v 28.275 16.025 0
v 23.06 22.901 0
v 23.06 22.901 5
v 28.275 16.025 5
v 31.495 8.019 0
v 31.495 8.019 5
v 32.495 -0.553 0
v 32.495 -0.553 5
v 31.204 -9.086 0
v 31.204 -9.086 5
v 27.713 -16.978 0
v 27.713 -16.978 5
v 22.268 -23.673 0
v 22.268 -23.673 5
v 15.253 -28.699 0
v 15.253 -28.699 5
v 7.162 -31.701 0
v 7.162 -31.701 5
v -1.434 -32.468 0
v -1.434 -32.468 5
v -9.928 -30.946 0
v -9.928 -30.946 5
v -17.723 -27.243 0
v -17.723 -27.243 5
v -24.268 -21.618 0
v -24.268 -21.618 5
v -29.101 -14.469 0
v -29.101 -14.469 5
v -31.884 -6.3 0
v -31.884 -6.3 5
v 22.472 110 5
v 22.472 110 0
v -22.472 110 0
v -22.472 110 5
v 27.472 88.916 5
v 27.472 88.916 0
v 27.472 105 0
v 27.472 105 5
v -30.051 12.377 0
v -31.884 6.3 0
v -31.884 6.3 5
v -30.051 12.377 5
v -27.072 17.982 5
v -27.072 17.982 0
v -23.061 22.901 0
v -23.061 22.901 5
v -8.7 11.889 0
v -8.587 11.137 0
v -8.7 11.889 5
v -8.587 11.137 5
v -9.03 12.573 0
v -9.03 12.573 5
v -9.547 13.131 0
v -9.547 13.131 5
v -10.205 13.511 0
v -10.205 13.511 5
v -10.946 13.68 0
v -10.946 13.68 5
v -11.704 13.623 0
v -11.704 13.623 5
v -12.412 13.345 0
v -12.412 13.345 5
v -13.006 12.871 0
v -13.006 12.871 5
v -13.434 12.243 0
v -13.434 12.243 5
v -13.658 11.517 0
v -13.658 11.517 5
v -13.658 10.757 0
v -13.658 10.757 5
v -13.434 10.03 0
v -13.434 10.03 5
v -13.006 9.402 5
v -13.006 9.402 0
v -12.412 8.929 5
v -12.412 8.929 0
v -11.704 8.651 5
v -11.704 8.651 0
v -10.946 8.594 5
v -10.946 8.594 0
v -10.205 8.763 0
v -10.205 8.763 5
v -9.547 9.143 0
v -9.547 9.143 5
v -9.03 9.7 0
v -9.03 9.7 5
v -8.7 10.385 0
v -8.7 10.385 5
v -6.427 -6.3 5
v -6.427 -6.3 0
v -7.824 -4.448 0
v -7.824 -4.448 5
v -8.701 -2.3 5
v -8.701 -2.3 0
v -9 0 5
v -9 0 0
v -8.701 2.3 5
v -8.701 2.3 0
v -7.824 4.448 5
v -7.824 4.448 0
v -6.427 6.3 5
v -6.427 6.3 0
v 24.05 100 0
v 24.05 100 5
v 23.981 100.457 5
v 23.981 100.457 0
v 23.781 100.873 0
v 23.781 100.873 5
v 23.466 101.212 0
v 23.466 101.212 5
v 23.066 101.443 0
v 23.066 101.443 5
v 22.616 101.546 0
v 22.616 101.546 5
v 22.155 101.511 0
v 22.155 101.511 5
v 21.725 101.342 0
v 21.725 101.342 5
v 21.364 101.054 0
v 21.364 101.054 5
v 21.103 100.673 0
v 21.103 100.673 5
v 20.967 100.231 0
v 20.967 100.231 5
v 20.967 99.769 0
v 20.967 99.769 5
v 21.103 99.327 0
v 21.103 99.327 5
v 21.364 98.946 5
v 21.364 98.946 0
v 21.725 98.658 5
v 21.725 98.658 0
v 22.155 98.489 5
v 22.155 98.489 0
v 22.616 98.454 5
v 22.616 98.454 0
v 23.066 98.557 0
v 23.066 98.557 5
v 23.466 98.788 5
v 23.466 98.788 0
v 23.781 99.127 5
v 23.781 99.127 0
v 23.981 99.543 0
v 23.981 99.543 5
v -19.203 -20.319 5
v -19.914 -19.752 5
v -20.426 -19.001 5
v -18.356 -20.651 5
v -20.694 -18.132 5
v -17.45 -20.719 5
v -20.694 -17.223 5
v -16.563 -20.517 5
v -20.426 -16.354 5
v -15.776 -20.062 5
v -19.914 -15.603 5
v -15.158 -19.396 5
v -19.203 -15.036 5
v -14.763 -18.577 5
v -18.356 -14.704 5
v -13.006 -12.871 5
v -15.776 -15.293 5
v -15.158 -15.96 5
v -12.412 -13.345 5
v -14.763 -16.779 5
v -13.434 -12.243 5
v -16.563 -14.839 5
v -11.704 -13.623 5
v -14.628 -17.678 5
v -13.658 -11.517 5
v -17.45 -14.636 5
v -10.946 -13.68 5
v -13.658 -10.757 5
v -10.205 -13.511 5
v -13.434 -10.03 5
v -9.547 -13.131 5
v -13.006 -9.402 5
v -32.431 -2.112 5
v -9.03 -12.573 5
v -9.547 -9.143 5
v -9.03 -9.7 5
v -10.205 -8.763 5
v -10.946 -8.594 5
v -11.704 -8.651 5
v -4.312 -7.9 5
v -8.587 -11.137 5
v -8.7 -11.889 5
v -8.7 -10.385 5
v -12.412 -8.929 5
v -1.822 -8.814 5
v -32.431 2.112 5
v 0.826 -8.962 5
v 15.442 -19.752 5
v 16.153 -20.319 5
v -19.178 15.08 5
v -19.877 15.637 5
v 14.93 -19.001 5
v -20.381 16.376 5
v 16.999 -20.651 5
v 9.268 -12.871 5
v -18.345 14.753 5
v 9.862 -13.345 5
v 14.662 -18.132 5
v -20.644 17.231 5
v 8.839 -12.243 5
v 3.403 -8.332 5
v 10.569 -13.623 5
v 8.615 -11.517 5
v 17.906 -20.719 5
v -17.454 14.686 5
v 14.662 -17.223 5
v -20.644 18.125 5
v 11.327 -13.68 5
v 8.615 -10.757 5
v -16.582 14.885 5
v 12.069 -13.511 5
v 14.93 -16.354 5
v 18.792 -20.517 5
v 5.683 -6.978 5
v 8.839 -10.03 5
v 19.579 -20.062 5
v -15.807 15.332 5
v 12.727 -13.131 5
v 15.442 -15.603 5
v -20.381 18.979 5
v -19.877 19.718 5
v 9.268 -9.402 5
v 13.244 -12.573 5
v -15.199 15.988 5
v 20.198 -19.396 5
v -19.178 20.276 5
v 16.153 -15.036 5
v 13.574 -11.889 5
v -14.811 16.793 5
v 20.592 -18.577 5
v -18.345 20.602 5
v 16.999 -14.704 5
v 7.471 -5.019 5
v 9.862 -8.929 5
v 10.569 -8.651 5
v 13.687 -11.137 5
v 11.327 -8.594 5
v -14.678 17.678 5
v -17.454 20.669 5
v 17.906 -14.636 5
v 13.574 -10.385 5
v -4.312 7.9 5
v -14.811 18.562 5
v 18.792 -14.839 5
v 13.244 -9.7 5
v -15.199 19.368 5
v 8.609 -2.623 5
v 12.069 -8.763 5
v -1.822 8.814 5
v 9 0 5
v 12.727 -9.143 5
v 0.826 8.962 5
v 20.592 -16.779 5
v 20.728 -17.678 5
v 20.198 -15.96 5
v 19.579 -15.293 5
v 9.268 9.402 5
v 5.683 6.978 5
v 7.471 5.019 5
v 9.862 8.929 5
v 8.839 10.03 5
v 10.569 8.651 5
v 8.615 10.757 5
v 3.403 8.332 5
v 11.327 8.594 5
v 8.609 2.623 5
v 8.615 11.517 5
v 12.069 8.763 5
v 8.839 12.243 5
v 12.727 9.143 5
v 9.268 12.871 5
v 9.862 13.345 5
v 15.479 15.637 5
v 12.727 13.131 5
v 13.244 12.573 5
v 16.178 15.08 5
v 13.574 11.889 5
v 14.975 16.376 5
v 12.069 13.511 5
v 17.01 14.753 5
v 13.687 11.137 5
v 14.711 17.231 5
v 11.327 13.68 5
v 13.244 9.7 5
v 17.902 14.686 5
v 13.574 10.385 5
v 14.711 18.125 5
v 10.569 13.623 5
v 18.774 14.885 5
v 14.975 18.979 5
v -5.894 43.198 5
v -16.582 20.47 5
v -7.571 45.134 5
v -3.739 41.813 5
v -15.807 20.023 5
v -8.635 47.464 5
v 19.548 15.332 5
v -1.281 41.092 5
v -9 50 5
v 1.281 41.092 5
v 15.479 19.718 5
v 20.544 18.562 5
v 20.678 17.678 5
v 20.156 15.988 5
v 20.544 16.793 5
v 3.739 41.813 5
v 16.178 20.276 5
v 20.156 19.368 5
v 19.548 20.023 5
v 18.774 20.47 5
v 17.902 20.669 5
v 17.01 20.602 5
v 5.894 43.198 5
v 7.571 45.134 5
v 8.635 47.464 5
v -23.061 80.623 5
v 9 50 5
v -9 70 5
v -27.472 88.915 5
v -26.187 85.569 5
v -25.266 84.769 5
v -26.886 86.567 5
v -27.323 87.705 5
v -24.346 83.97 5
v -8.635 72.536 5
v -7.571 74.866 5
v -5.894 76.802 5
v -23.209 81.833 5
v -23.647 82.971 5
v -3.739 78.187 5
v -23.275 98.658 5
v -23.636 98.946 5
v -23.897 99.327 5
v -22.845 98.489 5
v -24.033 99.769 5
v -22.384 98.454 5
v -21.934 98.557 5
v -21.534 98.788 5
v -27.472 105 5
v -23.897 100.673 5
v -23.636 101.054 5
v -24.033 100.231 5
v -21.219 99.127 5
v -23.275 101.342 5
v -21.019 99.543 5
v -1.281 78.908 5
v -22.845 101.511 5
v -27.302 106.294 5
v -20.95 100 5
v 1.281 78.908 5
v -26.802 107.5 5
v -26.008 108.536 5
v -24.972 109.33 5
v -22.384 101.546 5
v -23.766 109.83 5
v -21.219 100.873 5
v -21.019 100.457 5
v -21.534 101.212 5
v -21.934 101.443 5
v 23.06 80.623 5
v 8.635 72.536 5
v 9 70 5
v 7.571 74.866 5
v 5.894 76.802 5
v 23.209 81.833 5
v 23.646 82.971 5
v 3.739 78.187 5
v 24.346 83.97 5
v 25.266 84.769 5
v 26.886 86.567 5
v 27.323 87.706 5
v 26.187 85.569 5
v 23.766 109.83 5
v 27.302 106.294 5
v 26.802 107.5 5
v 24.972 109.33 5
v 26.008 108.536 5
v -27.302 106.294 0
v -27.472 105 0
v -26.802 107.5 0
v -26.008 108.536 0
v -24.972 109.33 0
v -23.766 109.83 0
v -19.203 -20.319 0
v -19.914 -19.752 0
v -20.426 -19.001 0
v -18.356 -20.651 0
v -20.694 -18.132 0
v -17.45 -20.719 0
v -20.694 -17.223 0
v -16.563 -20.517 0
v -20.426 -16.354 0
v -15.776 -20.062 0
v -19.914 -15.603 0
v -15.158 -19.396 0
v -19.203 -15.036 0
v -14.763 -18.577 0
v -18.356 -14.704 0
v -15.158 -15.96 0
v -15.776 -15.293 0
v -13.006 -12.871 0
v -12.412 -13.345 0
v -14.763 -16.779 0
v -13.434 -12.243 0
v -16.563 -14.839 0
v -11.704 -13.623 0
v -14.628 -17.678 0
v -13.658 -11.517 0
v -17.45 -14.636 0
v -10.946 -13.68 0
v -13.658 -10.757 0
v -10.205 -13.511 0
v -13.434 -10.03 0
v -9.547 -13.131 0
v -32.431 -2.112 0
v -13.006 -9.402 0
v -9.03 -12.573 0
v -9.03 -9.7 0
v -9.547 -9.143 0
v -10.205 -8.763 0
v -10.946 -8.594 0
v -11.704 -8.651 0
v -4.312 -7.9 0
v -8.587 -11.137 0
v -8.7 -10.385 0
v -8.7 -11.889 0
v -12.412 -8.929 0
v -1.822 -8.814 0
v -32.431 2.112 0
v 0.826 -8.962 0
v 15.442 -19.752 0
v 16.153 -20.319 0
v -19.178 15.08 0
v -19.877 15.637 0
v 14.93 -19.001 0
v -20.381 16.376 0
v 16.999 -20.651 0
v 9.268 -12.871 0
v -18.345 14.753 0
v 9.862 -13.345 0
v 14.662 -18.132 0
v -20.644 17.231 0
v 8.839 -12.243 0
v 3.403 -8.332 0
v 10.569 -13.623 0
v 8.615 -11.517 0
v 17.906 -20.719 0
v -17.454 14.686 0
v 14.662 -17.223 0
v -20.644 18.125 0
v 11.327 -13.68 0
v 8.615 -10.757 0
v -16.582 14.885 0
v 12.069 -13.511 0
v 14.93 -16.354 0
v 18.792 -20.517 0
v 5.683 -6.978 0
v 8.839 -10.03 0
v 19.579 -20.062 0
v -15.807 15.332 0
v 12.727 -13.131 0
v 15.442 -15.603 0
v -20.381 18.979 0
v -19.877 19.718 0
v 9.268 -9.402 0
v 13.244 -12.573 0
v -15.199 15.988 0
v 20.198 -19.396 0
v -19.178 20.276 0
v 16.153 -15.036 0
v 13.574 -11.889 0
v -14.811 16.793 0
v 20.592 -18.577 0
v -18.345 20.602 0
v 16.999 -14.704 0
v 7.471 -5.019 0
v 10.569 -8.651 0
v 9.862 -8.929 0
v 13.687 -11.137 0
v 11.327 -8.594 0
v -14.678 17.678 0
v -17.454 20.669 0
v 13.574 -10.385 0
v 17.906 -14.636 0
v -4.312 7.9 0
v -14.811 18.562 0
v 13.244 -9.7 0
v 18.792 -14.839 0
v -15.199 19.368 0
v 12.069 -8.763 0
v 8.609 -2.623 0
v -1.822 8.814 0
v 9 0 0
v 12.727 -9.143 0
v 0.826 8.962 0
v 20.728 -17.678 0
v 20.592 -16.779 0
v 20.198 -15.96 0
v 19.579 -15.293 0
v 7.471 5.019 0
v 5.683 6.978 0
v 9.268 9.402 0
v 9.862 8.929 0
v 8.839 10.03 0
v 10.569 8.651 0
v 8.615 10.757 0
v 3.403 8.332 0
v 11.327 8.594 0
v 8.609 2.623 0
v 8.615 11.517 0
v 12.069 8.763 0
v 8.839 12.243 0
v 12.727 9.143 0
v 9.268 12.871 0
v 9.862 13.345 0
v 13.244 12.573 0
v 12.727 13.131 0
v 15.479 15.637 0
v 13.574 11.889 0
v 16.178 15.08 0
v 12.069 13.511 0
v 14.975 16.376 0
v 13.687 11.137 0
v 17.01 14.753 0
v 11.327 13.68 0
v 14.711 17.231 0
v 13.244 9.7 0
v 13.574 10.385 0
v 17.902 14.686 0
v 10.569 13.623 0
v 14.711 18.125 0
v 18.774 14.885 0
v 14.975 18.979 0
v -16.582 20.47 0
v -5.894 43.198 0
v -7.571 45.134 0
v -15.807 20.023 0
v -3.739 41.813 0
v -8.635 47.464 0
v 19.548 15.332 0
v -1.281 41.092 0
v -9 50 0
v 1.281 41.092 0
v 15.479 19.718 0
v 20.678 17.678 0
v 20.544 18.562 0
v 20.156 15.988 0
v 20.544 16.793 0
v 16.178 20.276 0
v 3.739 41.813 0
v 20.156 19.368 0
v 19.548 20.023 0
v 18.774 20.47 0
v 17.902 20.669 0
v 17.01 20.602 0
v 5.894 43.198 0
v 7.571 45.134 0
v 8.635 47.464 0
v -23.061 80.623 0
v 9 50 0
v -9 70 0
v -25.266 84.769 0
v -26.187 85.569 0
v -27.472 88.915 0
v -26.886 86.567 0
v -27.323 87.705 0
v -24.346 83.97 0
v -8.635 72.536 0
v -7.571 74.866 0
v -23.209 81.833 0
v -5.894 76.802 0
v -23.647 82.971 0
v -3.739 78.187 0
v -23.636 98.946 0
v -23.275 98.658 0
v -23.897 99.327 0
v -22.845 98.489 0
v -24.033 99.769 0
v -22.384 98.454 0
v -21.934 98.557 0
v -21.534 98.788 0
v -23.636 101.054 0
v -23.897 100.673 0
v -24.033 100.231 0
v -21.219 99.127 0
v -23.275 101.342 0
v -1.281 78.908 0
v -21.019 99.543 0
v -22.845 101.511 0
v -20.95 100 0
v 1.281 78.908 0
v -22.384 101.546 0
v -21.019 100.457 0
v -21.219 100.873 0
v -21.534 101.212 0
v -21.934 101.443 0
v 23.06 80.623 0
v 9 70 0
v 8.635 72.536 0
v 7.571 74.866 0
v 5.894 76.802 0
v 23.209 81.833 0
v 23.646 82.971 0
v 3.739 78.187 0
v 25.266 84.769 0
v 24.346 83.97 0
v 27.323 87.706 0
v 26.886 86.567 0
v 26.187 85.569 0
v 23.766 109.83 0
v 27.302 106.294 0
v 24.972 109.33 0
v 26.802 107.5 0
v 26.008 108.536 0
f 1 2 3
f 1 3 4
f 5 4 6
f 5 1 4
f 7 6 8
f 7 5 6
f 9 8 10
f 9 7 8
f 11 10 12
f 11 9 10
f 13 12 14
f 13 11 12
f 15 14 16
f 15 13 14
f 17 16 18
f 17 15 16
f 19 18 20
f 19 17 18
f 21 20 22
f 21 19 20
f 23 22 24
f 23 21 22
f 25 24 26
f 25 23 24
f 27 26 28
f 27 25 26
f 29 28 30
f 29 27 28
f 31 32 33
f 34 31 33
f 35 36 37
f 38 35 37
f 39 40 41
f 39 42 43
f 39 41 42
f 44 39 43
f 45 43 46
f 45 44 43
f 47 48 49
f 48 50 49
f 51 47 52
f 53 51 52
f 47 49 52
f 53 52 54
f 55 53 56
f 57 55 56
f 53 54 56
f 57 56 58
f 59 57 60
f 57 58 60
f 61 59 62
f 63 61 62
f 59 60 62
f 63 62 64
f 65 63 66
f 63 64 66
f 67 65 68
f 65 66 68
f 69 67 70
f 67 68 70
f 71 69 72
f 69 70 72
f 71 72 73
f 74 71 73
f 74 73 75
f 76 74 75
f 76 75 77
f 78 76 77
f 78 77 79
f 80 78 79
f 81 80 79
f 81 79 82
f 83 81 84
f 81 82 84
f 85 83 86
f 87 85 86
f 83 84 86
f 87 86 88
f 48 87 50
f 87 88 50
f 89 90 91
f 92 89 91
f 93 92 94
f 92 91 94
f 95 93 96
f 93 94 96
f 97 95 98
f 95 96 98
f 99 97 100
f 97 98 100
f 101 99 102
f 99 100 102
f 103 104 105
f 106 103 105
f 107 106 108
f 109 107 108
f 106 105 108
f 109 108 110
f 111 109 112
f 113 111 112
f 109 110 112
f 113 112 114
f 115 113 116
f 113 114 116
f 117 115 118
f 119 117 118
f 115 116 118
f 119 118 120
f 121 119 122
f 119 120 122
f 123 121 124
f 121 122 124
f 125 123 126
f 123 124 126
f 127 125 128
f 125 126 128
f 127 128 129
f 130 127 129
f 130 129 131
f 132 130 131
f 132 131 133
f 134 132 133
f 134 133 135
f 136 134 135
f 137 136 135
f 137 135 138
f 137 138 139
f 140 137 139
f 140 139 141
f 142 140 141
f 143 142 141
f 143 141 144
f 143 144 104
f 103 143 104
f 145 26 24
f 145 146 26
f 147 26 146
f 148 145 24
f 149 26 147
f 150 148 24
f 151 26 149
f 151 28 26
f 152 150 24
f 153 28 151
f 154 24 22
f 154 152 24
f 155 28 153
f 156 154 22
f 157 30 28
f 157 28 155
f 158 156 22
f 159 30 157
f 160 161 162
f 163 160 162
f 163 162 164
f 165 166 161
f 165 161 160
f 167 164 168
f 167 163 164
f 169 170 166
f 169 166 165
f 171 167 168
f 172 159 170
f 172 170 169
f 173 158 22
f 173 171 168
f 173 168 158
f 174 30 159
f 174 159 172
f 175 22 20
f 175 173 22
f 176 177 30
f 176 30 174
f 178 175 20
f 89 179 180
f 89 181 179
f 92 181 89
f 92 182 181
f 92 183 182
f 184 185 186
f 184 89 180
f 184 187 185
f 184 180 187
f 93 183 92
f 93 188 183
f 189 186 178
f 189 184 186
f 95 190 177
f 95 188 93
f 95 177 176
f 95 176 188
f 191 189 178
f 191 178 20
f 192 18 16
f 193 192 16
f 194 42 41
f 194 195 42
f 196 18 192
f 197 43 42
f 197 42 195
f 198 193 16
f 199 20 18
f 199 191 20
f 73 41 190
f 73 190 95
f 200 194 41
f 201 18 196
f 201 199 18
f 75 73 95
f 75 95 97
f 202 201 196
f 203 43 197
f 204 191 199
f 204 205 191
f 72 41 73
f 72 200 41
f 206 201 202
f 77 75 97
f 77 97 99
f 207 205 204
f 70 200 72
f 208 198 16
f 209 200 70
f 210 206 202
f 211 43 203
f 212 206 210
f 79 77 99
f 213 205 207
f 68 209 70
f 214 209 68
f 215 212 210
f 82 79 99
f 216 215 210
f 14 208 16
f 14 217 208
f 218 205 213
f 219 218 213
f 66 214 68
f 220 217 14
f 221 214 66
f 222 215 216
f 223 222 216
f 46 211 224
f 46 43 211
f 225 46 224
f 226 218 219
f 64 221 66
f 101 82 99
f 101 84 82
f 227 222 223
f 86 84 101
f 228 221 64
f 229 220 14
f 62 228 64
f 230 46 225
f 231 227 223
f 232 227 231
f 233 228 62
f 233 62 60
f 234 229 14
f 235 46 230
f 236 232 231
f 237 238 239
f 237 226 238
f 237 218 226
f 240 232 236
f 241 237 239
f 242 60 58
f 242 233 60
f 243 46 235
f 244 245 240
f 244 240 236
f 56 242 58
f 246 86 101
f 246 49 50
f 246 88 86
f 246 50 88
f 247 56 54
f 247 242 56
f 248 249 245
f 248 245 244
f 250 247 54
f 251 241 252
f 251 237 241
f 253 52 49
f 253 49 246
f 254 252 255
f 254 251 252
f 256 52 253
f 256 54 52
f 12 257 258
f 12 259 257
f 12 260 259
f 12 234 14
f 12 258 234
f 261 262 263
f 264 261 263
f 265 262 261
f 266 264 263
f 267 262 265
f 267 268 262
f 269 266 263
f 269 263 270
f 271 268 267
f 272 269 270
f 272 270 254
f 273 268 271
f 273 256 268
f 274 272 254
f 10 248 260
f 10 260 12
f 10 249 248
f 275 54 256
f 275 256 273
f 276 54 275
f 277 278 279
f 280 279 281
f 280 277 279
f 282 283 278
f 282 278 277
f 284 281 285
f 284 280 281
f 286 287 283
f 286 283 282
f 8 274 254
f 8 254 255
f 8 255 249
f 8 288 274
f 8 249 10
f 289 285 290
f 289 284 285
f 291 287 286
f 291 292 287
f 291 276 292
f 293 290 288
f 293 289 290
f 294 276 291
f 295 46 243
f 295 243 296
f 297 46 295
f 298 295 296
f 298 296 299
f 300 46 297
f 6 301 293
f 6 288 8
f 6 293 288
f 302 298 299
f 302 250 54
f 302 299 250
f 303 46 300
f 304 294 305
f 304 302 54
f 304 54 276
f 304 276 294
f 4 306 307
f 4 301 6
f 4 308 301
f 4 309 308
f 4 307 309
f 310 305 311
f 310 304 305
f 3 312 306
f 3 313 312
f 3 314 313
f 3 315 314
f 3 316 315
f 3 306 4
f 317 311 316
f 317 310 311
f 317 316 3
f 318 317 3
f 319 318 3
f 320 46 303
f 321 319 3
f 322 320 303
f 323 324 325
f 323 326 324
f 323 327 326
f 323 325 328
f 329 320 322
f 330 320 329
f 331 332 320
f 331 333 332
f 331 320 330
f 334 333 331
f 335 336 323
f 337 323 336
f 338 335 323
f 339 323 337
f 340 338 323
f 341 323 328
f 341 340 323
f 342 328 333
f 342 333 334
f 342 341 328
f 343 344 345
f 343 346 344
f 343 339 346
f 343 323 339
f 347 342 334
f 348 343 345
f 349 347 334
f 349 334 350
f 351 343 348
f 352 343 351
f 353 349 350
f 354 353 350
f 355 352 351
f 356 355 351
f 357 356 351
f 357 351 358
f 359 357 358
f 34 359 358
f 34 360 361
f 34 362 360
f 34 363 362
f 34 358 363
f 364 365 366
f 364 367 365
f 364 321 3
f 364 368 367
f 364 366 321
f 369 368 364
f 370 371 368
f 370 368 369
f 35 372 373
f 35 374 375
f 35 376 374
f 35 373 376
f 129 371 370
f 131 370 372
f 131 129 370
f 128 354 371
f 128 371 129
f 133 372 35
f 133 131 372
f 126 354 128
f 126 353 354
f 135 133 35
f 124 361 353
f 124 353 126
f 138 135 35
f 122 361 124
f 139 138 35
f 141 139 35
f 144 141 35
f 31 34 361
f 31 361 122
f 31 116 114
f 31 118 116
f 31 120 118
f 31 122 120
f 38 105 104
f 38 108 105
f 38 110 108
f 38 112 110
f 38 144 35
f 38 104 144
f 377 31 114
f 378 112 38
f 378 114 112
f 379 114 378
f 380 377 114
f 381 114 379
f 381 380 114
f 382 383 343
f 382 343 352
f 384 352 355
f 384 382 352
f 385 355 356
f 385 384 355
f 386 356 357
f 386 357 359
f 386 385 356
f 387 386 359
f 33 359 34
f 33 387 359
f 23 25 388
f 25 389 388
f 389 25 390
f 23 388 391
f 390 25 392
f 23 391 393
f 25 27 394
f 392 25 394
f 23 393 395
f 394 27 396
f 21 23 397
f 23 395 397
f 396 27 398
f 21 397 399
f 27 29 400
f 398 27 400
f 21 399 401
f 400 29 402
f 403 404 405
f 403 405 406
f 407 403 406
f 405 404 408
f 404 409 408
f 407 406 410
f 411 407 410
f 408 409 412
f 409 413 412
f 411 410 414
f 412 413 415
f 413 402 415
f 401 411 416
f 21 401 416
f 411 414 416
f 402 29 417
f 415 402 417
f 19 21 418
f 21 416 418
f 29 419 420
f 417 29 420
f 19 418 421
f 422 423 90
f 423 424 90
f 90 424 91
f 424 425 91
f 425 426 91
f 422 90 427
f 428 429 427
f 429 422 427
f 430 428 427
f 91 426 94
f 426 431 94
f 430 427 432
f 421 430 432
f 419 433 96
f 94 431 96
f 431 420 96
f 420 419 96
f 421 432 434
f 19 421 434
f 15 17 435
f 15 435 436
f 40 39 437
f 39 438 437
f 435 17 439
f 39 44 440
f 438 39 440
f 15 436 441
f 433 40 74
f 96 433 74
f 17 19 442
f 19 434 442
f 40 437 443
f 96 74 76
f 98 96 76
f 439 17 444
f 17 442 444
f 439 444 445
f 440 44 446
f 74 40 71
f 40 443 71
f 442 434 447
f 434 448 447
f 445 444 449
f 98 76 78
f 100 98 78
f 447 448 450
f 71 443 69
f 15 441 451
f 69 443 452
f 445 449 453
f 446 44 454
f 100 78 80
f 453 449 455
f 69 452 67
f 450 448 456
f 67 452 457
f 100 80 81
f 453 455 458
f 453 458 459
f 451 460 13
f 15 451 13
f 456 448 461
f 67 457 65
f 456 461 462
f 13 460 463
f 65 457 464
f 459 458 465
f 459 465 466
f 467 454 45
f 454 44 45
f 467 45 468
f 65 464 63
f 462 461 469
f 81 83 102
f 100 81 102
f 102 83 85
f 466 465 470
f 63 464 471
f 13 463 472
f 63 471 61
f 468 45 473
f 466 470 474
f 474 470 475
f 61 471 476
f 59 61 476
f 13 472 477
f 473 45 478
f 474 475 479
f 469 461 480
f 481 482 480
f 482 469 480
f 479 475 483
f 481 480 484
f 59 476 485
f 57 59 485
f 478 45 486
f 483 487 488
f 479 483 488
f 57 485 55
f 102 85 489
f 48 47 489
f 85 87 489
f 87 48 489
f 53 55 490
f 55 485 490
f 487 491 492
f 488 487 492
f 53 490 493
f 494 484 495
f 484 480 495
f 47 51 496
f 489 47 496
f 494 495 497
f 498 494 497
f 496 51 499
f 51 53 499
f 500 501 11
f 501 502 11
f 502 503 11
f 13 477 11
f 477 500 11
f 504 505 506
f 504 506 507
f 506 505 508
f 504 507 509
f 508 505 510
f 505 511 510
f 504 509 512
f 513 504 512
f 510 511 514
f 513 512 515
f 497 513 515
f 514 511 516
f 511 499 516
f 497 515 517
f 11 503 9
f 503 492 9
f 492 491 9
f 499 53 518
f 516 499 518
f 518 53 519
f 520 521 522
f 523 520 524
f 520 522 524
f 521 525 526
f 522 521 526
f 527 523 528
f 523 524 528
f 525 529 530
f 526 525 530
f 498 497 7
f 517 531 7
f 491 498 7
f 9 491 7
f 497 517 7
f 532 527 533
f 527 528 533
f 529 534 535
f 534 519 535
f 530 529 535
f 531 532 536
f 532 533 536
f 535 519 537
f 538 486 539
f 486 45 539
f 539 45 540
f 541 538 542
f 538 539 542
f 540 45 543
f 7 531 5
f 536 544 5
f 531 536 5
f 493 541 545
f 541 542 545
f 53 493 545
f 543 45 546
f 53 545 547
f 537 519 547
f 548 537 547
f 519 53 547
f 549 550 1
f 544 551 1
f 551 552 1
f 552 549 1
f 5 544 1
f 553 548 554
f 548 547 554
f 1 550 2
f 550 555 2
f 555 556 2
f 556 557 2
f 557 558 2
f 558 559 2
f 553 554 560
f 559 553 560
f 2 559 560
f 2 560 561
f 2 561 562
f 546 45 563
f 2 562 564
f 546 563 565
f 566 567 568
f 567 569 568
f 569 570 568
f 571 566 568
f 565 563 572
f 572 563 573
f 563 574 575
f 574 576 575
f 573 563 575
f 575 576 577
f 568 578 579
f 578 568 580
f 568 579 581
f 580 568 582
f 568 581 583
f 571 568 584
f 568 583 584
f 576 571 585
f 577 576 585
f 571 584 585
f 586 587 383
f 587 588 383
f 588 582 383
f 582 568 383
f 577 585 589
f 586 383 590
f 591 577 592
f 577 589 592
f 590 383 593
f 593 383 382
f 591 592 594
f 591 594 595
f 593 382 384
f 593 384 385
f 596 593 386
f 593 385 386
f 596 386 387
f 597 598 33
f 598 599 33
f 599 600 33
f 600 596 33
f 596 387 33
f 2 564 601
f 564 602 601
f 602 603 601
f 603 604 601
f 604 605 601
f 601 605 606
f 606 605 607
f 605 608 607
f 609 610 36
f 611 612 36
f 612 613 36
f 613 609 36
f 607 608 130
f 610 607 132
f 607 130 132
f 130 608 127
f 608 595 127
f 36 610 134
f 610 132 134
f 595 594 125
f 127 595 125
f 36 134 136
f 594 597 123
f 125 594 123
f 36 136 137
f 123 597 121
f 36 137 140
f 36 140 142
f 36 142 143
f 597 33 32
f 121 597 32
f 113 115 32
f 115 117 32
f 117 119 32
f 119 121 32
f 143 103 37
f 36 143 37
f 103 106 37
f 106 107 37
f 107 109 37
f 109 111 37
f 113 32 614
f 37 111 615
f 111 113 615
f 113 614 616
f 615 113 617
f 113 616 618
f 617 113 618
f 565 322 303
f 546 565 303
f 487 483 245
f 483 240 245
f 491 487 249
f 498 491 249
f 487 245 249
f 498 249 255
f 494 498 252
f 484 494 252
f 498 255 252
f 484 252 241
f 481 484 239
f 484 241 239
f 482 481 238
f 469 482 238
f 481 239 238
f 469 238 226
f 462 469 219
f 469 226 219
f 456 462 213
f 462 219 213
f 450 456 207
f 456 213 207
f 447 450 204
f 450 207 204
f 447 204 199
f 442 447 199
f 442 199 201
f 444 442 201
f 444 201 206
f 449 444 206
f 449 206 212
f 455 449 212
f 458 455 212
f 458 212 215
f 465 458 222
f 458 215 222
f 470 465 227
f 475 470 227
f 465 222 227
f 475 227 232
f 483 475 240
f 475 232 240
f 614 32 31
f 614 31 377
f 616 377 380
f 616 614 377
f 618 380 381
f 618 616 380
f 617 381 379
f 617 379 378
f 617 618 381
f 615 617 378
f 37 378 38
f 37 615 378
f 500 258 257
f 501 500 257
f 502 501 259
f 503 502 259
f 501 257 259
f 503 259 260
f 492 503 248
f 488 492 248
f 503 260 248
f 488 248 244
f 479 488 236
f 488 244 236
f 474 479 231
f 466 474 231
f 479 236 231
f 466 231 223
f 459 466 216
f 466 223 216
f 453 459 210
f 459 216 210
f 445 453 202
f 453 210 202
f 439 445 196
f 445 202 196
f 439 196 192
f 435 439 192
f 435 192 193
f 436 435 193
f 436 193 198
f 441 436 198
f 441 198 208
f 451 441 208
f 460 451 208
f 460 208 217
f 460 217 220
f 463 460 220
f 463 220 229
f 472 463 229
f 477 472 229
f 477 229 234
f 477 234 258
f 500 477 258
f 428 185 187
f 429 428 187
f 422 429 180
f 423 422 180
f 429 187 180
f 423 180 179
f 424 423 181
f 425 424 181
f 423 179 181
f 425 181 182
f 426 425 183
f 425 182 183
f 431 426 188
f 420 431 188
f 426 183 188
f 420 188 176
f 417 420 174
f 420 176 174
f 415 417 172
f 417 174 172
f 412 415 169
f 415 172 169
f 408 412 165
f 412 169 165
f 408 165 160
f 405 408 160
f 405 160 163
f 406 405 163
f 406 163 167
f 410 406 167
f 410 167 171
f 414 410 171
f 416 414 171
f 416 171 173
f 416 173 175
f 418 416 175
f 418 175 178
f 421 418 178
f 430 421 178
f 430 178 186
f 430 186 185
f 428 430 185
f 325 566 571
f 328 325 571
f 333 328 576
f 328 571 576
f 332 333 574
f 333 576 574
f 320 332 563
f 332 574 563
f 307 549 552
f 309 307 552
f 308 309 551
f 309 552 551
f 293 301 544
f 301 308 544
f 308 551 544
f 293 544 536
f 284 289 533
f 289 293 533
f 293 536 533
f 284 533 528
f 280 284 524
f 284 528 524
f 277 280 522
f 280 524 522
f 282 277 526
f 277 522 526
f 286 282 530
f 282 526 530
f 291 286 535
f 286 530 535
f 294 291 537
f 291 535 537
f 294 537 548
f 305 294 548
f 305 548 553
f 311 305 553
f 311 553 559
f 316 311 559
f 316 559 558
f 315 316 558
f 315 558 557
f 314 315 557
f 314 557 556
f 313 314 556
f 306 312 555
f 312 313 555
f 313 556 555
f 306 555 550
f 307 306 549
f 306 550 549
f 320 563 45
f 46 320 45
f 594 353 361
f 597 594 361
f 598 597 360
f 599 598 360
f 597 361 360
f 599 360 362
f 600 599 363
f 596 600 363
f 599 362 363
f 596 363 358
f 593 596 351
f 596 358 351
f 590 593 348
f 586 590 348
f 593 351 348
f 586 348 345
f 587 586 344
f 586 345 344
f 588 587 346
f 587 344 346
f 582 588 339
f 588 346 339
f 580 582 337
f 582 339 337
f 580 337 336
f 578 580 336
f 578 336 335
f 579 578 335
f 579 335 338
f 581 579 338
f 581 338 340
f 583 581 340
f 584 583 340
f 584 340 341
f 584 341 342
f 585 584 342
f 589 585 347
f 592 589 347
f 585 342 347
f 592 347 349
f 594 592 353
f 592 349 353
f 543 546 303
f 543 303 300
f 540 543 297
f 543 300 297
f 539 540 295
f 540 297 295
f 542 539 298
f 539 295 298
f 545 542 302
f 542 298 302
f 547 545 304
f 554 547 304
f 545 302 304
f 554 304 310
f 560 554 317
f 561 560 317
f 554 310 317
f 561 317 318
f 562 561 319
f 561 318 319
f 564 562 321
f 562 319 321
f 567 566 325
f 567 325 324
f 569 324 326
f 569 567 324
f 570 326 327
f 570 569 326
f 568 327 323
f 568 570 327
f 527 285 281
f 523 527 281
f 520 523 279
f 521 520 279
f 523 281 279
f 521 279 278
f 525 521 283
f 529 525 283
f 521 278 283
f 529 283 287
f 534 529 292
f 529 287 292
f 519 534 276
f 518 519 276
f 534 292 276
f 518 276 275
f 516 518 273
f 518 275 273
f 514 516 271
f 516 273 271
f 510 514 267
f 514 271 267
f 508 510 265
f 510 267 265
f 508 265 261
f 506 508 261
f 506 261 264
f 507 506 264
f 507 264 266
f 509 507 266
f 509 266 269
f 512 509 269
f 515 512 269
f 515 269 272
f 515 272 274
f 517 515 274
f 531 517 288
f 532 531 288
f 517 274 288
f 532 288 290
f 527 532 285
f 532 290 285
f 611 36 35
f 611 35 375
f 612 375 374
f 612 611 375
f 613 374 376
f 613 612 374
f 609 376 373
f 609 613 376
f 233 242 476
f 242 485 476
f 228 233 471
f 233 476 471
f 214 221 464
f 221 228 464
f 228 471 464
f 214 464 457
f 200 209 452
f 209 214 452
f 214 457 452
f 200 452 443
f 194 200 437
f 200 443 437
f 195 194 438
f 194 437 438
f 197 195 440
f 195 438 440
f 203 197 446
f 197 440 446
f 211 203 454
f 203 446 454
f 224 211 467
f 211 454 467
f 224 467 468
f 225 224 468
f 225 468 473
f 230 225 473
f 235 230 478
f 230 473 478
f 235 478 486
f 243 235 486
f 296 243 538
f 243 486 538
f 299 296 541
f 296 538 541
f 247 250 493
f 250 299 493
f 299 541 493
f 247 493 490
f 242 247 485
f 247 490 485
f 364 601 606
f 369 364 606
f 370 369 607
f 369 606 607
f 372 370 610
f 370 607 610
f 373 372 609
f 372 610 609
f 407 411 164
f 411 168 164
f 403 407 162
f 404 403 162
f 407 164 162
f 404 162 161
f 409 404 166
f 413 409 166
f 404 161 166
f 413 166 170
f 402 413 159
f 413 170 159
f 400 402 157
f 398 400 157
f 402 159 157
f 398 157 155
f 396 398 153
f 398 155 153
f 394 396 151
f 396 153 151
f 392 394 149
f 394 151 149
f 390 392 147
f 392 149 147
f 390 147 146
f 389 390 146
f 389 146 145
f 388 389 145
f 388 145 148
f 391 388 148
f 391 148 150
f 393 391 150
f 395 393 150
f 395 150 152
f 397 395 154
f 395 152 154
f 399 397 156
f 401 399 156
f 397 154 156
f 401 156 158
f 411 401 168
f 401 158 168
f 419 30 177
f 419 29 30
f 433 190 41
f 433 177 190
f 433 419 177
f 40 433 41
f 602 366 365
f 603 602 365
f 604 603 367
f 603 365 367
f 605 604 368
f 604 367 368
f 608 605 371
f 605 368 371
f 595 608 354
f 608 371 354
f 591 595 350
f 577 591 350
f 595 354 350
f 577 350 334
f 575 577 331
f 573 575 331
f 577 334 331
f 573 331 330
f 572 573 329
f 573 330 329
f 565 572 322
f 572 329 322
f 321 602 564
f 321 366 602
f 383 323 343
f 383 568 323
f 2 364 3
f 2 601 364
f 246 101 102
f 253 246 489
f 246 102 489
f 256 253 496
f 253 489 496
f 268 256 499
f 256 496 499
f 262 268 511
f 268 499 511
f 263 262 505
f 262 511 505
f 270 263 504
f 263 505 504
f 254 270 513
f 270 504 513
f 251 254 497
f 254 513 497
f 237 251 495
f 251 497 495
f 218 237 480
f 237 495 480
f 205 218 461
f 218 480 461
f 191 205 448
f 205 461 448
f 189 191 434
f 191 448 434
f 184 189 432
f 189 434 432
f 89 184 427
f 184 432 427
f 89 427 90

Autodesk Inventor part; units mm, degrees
ref_plane "YZ Plane" through (0, 0, 0) normal (1, 0, 0) x (0, 1, 0)
ref_plane "XZ Plane" through (0, 0, 0) normal (0, 1, 0) x (-1, 0, 0)
ref_plane "XY Plane" through (0, 0, 0) normal (0, 0, 1) x (1, 0, 0)
sketch "Sketch1" plane through (0, 0, 0) normal (0, 0, 1) x (1, 0, 0)
  circle A0 centre (17.6777, -17.6777) radius 3
  circle A1 centre (-17.6777, -17.6777) radius 3
  circle A2 centre (-17.6777, 17.6777) radius 3
  circle A3 centre (17.6777, 17.6777) radius 3
  circle A4 centre (-11.1369, -11.1369) radius 2.5
  circle A5 centre (11.1369, -11.1369) radius 2.5
  circle A6 centre (-11.1369, 11.1369) radius 2.5
  circle A7 centre (11.1369, 11.1369) radius 2.5
  arc A8 (-6.4273, -6.3) -> (-6.4273, 6.3) centre (0, 0) ccw
  arc A9 (-31.8835, -6.3) -> (-31.8835, 6.3) centre (0, 0) ccw
  circle A10 centre (0, 0) radius 32.5
  circle A11 centre (0, 0) radius 9
  line L0 (22.4721, 110) -> (-22.4721, 110)
  line L1 (-27.4721, 105) -> (-27.4721, 90)
  line L2 (-23.0608, 85.5886) -> (-23.0608, 31.884)
  line L3 (23.0603, 31.884) -> (23.0603, 85.5881)
  line L4 (27.4721, 90) -> (27.4721, 105)
  circle A12 centre (22.5, 100) radius 1.5
  circle A13 centre (-22.5, 100) radius 1.5
  circle A14 centre (11.1369, -11.1369) radius 2.5
  circle A15 centre (11.1369, 11.1369) radius 2.5
  circle A16 centre (-11.1369, 11.1369) radius 2.5
  circle A17 centre (-11.1369, -11.1369) radius 2.5
  line L5 (27.4721, 105) -> (27.4721, 110)
  line L6 (27.4721, 110) -> (-27.4721, 110)
  line L7 (-27.4721, 110) -> (-27.4721, 105)
  line L8 (27.4721, 90) -> (27.4721, 85.5881)
  line L9 (27.4721, 85.5881) -> (-27.4721, 85.5881)
  line L10 (-27.4721, 85.5881) -> (-27.4721, 90)
  line L11 (-23.0608, 31.884) -> (-23.0608, 22.9009)
  line L12 (23.0603, 31.884) -> (23.0603, 22.9014)
  point P0 (-31.8835, 6.3)
  point P1 (-23.0608, 85.5881)
  point P2 (-6.4273, 6.3)
extrude "Extrusion1" add sketch "Sketch1" along normal blind 5
fillet "Fillet1" radius 5 6 edges at (-27.4721, 110, 2.5) (27.4721, 110, 2.5) (-27.4721, 85.5881, 2.5) (-23.0608, 85.5881, 2.5) (27.4721, 85.5881, 2.5) (23.0603, 85.5881, 2.5)
sketch "Sketch2" plane through (0, 0, 5) normal (0, 0, 1) x (1, 0, 0)
  circle A0 centre (-22.5, 100) radius 1.5 projected
  arc A1 (9, 70) -> (-9, 70) centre (0, 70) ccw
  line L0 (-9, 70) -> (-9, 50)
  line L1 (9, 70) -> (9, 50)
  line L2 (0, 40) -> (0, 50)
  arc A2 (-9, 50) -> (9, 50) centre (0, 50) ccw
  point P0 (0, 0)
  dimension "d9" = 18
  dimension "d12" = 10
  dimension "d13" = 18
extrude "Extrusion2" cut sketch "Sketch2" against normal blind 10 contours L1 A2 L0 A1
sketch "Sketch3" plane through (0, 0, 5) normal (0, 0, 1) x (1, 0, 0)
  circle A0 centre (-22.5, 100) radius 1.5 projected
  circle A1 centre (-22.5, 100) radius 1.55
  circle A2 centre (22.5, 100) radius 1.5 projected
  circle A3 centre (22.5, 100) radius 1.55
  circle A4 centre (-17.6777, 17.6777) radius 3 projected
  circle A5 centre (-17.6777, 17.6777) radius 3.05
  circle A6 centre (17.6777, 17.6777) radius 3 projected
  circle A7 centre (17.6777, 17.6777) radius 3.05
  circle A8 centre (17.6777, -17.6777) radius 3 projected
  circle A9 centre (17.6777, -17.6777) radius 3.05
  circle A10 centre (-17.6777, -17.6777) radius 3 projected
  circle A11 centre (-17.6777, -17.6777) radius 3.05
  circle A12 centre (-11.1369, 11.1369) radius 2.5 projected
  circle A13 centre (-11.1369, 11.1369) radius 2.55
  circle A14 centre (11.1369, 11.1369) radius 2.5 projected
  circle A15 centre (11.1369, 11.1369) radius 2.55
  circle A16 centre (11.1369, -11.1369) radius 2.5 projected
  circle A17 centre (11.1369, -11.1369) radius 2.55
  circle A18 centre (-11.1369, -11.1369) radius 2.5 projected
  circle A19 centre (-11.1369, -11.1369) radius 2.55
  point P0 (0, 0)
  dimension "d14" = 3.1
  dimension "d15" = 3.1
  dimension "d16" = 6.1
  dimension "d17" = 6.1
  dimension "d18" = 6.1
  dimension "d19" = 6.1
  dimension "d20" = 5.1
  dimension "d21" = 5.1
  dimension "d22" = 5.1
  dimension "d23" = 5.1
extrude "Extrusion3" cut sketch "Sketch3" against normal blind 10 contours A0 | A1 | A2 | A3 | A4 | A6 | A8 | A9 | A10 | A11 | A12 | A13 | A14 | A15 | A16 | A17 | A18 | A19
properties part number "Part2_Camera"
